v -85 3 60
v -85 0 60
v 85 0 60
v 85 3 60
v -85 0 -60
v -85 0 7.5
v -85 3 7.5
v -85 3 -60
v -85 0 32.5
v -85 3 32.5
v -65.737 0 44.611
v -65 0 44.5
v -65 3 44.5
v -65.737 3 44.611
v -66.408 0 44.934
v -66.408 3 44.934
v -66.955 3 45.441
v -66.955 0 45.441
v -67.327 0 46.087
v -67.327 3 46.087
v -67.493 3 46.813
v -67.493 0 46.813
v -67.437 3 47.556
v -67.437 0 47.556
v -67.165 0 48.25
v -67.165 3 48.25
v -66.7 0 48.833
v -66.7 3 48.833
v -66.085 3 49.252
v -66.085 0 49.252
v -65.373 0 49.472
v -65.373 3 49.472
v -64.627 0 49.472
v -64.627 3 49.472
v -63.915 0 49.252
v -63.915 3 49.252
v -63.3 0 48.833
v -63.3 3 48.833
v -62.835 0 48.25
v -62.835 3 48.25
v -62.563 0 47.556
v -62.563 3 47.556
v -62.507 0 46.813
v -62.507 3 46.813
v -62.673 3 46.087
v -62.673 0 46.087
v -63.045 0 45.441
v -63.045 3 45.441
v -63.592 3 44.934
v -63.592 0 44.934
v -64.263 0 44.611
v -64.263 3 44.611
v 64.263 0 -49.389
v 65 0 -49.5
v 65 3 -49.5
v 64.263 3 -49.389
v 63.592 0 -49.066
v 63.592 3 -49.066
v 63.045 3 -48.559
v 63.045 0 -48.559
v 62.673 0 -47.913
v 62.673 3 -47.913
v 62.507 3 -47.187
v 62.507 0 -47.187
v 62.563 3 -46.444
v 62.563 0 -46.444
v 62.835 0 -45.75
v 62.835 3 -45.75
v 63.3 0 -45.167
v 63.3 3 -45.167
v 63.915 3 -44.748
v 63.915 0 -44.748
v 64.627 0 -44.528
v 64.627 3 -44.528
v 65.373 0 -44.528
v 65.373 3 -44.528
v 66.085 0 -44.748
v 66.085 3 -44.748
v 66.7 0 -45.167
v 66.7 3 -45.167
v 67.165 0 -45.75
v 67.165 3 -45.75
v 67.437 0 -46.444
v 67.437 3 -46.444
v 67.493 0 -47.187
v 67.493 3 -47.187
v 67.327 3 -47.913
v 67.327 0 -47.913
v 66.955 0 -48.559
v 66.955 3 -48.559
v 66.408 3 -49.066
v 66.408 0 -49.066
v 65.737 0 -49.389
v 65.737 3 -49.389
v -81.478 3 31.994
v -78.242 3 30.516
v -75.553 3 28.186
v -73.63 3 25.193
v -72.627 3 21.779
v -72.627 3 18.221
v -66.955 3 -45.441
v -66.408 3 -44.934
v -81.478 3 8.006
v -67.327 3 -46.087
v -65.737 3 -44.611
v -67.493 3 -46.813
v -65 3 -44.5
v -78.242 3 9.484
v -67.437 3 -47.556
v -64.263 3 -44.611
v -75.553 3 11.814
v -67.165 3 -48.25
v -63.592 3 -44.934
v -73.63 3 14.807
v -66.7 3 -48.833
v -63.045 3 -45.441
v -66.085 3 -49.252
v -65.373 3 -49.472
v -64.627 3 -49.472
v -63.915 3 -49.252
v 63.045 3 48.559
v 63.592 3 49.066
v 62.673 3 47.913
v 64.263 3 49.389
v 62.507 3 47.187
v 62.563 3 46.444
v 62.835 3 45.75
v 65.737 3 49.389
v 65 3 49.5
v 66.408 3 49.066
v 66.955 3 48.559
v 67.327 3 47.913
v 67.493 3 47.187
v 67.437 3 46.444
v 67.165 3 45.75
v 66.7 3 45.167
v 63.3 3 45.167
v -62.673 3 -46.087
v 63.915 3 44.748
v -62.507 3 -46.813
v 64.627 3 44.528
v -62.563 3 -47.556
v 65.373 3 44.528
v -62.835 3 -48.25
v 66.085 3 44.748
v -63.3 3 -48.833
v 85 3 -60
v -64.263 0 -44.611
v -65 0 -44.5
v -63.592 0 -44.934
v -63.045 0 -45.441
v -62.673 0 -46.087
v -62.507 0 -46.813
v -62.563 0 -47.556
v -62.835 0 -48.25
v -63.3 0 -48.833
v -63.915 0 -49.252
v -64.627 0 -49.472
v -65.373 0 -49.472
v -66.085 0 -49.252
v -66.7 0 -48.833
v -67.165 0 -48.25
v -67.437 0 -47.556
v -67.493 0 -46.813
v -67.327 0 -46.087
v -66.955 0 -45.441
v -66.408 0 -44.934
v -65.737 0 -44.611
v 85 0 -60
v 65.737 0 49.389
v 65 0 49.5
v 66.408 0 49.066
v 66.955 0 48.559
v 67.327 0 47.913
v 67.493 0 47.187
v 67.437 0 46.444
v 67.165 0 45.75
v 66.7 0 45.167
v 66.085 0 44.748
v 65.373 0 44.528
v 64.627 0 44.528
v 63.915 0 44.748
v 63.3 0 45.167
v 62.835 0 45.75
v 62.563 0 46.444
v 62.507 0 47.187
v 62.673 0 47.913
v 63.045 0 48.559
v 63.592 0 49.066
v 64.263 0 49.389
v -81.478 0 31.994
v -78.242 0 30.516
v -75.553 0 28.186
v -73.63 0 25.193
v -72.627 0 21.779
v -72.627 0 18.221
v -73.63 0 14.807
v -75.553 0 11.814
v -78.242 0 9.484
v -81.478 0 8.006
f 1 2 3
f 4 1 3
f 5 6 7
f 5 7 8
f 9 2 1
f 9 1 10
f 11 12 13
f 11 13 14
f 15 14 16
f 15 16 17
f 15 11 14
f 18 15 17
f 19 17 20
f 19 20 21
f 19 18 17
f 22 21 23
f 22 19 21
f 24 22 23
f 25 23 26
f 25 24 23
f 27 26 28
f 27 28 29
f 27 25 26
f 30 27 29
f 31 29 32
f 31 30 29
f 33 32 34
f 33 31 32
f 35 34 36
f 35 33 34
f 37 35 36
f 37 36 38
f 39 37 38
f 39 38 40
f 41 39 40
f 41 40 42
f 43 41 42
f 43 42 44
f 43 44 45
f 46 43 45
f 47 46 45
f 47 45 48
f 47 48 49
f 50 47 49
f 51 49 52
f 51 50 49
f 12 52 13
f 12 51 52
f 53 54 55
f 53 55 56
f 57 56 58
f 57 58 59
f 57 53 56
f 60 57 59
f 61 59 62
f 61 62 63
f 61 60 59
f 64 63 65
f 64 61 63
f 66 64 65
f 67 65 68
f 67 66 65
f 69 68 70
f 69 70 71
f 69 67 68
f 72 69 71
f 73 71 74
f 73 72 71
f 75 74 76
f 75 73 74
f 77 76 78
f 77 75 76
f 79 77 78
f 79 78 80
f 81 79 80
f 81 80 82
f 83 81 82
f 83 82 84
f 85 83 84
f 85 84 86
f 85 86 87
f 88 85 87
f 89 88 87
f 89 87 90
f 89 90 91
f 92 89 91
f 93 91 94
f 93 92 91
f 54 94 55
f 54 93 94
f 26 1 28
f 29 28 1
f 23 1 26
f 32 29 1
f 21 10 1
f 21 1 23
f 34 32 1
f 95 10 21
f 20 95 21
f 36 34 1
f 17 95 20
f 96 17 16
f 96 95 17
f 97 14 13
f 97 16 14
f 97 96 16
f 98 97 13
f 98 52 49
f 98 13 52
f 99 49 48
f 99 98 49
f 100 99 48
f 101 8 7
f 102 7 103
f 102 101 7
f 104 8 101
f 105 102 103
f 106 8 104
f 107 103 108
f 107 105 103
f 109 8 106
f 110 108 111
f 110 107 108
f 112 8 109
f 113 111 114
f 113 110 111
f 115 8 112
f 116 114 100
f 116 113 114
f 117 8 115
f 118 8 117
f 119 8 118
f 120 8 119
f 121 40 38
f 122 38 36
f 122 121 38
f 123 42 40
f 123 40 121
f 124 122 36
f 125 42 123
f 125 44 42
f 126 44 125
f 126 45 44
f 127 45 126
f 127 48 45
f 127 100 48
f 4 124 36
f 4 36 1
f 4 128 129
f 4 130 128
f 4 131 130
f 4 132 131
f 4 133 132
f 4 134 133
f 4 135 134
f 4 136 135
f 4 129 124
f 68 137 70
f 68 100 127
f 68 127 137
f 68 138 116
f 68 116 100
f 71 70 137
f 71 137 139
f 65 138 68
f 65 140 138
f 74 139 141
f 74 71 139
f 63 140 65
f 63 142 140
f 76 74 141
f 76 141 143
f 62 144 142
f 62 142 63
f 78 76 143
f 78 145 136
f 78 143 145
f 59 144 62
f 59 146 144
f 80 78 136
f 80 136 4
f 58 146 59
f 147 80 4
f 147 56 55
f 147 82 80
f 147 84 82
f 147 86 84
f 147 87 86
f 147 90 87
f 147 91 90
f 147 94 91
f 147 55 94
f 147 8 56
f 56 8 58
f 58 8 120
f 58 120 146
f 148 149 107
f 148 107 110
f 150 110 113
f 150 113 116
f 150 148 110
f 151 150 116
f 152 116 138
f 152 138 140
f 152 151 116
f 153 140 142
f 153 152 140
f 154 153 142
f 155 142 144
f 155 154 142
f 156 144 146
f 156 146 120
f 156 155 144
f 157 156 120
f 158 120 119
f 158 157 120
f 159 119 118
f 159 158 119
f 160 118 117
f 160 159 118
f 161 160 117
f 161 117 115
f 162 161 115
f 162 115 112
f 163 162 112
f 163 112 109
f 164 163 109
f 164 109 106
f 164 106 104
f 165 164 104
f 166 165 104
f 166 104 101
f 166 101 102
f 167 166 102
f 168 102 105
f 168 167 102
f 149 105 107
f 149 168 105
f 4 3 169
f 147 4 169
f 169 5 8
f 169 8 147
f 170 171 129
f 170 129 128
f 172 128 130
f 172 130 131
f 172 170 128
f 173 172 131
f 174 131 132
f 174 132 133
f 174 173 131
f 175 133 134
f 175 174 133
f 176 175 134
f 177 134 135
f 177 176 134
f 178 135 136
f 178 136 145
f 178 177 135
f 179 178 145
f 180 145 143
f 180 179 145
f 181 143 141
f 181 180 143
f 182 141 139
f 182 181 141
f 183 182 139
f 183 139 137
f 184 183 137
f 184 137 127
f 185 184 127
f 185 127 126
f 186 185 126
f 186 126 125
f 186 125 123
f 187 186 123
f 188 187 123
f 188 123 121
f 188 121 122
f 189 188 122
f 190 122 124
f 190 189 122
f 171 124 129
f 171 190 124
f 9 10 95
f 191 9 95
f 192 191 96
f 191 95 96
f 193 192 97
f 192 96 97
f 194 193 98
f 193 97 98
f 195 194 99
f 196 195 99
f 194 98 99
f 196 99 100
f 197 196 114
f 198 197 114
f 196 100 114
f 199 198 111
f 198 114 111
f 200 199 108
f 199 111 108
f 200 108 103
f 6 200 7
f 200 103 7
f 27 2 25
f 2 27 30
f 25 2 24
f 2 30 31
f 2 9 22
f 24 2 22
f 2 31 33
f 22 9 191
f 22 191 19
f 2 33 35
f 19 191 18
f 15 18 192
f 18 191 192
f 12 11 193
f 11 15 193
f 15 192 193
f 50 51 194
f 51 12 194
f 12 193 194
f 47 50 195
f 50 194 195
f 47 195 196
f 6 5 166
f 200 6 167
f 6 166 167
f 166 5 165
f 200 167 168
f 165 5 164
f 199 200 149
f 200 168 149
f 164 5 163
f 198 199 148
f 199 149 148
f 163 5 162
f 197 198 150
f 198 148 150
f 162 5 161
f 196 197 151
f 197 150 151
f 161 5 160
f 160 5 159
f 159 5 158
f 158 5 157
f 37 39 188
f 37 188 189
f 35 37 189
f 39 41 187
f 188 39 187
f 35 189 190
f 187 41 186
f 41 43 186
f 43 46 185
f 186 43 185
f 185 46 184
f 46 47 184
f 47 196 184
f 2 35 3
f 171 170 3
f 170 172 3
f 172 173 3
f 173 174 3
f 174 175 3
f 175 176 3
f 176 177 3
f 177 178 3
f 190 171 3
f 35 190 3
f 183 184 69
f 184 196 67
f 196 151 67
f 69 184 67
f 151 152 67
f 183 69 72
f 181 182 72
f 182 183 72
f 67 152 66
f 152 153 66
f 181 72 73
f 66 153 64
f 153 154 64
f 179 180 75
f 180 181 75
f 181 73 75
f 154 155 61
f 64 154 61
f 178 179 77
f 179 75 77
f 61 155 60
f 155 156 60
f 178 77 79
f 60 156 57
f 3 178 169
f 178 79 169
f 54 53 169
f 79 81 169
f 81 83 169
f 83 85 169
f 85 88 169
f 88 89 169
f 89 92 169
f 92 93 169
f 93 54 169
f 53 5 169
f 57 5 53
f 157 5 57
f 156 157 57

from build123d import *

# Parameters (mm, degrees)
SKETCH1_W           = 170
SKETCH1_H           = 120
SKETCH1_R           = 2.5
BOSS_EXTRUDE1_DEPTH = 3
CUT_EXTRUDE1_REACH  = 106.087
SKETCH2_R           = 12.5


with BuildPart() as part:
    # Sketch1 → Boss-Extrude1 (new body)
    with BuildSketch(Plane(origin=(0, 0, 0), x_dir=(1, 0, 0), z_dir=(0, 1, 0))):
        Rectangle(SKETCH1_W, SKETCH1_H)
        with Locations(Location((-65, 47, 0), (0, 0, 270))):
            Circle(SKETCH1_R, mode=Mode.SUBTRACT)
        with Locations(Location((-65, -47, 0), (0, 0, 90))):
            Circle(SKETCH1_R, mode=Mode.SUBTRACT)
        with Locations(Location((65, -47, 0), (0, 0, 270))):
            Circle(SKETCH1_R, mode=Mode.SUBTRACT)
        with Locations(Location((65, 47, 0), (0, 0, 90))):
            Circle(SKETCH1_R, mode=Mode.SUBTRACT)
    extrude(amount=BOSS_EXTRUDE1_DEPTH)

    # Sketch2 → Cut-Extrude1 (cut, up to next)
    with BuildSketch(Plane(origin=(0, 3, 0), x_dir=(1, 0, 0), z_dir=(0, 1, 0)), mode=Mode.PRIVATE) as cut_extrude1_sk1:
        with Locations((-85, -20)):
            Circle(SKETCH2_R)
    cut_extrude1_tool1 = extrude(cut_extrude1_sk1.sketch, amount=-CUT_EXTRUDE1_REACH, mode=Mode.PRIVATE) & part.part
    add(cut_extrude1_tool1.solids().sort_by_distance((-85, 3, 20))[0], mode=Mode.SUBTRACT)


solid = part.part
